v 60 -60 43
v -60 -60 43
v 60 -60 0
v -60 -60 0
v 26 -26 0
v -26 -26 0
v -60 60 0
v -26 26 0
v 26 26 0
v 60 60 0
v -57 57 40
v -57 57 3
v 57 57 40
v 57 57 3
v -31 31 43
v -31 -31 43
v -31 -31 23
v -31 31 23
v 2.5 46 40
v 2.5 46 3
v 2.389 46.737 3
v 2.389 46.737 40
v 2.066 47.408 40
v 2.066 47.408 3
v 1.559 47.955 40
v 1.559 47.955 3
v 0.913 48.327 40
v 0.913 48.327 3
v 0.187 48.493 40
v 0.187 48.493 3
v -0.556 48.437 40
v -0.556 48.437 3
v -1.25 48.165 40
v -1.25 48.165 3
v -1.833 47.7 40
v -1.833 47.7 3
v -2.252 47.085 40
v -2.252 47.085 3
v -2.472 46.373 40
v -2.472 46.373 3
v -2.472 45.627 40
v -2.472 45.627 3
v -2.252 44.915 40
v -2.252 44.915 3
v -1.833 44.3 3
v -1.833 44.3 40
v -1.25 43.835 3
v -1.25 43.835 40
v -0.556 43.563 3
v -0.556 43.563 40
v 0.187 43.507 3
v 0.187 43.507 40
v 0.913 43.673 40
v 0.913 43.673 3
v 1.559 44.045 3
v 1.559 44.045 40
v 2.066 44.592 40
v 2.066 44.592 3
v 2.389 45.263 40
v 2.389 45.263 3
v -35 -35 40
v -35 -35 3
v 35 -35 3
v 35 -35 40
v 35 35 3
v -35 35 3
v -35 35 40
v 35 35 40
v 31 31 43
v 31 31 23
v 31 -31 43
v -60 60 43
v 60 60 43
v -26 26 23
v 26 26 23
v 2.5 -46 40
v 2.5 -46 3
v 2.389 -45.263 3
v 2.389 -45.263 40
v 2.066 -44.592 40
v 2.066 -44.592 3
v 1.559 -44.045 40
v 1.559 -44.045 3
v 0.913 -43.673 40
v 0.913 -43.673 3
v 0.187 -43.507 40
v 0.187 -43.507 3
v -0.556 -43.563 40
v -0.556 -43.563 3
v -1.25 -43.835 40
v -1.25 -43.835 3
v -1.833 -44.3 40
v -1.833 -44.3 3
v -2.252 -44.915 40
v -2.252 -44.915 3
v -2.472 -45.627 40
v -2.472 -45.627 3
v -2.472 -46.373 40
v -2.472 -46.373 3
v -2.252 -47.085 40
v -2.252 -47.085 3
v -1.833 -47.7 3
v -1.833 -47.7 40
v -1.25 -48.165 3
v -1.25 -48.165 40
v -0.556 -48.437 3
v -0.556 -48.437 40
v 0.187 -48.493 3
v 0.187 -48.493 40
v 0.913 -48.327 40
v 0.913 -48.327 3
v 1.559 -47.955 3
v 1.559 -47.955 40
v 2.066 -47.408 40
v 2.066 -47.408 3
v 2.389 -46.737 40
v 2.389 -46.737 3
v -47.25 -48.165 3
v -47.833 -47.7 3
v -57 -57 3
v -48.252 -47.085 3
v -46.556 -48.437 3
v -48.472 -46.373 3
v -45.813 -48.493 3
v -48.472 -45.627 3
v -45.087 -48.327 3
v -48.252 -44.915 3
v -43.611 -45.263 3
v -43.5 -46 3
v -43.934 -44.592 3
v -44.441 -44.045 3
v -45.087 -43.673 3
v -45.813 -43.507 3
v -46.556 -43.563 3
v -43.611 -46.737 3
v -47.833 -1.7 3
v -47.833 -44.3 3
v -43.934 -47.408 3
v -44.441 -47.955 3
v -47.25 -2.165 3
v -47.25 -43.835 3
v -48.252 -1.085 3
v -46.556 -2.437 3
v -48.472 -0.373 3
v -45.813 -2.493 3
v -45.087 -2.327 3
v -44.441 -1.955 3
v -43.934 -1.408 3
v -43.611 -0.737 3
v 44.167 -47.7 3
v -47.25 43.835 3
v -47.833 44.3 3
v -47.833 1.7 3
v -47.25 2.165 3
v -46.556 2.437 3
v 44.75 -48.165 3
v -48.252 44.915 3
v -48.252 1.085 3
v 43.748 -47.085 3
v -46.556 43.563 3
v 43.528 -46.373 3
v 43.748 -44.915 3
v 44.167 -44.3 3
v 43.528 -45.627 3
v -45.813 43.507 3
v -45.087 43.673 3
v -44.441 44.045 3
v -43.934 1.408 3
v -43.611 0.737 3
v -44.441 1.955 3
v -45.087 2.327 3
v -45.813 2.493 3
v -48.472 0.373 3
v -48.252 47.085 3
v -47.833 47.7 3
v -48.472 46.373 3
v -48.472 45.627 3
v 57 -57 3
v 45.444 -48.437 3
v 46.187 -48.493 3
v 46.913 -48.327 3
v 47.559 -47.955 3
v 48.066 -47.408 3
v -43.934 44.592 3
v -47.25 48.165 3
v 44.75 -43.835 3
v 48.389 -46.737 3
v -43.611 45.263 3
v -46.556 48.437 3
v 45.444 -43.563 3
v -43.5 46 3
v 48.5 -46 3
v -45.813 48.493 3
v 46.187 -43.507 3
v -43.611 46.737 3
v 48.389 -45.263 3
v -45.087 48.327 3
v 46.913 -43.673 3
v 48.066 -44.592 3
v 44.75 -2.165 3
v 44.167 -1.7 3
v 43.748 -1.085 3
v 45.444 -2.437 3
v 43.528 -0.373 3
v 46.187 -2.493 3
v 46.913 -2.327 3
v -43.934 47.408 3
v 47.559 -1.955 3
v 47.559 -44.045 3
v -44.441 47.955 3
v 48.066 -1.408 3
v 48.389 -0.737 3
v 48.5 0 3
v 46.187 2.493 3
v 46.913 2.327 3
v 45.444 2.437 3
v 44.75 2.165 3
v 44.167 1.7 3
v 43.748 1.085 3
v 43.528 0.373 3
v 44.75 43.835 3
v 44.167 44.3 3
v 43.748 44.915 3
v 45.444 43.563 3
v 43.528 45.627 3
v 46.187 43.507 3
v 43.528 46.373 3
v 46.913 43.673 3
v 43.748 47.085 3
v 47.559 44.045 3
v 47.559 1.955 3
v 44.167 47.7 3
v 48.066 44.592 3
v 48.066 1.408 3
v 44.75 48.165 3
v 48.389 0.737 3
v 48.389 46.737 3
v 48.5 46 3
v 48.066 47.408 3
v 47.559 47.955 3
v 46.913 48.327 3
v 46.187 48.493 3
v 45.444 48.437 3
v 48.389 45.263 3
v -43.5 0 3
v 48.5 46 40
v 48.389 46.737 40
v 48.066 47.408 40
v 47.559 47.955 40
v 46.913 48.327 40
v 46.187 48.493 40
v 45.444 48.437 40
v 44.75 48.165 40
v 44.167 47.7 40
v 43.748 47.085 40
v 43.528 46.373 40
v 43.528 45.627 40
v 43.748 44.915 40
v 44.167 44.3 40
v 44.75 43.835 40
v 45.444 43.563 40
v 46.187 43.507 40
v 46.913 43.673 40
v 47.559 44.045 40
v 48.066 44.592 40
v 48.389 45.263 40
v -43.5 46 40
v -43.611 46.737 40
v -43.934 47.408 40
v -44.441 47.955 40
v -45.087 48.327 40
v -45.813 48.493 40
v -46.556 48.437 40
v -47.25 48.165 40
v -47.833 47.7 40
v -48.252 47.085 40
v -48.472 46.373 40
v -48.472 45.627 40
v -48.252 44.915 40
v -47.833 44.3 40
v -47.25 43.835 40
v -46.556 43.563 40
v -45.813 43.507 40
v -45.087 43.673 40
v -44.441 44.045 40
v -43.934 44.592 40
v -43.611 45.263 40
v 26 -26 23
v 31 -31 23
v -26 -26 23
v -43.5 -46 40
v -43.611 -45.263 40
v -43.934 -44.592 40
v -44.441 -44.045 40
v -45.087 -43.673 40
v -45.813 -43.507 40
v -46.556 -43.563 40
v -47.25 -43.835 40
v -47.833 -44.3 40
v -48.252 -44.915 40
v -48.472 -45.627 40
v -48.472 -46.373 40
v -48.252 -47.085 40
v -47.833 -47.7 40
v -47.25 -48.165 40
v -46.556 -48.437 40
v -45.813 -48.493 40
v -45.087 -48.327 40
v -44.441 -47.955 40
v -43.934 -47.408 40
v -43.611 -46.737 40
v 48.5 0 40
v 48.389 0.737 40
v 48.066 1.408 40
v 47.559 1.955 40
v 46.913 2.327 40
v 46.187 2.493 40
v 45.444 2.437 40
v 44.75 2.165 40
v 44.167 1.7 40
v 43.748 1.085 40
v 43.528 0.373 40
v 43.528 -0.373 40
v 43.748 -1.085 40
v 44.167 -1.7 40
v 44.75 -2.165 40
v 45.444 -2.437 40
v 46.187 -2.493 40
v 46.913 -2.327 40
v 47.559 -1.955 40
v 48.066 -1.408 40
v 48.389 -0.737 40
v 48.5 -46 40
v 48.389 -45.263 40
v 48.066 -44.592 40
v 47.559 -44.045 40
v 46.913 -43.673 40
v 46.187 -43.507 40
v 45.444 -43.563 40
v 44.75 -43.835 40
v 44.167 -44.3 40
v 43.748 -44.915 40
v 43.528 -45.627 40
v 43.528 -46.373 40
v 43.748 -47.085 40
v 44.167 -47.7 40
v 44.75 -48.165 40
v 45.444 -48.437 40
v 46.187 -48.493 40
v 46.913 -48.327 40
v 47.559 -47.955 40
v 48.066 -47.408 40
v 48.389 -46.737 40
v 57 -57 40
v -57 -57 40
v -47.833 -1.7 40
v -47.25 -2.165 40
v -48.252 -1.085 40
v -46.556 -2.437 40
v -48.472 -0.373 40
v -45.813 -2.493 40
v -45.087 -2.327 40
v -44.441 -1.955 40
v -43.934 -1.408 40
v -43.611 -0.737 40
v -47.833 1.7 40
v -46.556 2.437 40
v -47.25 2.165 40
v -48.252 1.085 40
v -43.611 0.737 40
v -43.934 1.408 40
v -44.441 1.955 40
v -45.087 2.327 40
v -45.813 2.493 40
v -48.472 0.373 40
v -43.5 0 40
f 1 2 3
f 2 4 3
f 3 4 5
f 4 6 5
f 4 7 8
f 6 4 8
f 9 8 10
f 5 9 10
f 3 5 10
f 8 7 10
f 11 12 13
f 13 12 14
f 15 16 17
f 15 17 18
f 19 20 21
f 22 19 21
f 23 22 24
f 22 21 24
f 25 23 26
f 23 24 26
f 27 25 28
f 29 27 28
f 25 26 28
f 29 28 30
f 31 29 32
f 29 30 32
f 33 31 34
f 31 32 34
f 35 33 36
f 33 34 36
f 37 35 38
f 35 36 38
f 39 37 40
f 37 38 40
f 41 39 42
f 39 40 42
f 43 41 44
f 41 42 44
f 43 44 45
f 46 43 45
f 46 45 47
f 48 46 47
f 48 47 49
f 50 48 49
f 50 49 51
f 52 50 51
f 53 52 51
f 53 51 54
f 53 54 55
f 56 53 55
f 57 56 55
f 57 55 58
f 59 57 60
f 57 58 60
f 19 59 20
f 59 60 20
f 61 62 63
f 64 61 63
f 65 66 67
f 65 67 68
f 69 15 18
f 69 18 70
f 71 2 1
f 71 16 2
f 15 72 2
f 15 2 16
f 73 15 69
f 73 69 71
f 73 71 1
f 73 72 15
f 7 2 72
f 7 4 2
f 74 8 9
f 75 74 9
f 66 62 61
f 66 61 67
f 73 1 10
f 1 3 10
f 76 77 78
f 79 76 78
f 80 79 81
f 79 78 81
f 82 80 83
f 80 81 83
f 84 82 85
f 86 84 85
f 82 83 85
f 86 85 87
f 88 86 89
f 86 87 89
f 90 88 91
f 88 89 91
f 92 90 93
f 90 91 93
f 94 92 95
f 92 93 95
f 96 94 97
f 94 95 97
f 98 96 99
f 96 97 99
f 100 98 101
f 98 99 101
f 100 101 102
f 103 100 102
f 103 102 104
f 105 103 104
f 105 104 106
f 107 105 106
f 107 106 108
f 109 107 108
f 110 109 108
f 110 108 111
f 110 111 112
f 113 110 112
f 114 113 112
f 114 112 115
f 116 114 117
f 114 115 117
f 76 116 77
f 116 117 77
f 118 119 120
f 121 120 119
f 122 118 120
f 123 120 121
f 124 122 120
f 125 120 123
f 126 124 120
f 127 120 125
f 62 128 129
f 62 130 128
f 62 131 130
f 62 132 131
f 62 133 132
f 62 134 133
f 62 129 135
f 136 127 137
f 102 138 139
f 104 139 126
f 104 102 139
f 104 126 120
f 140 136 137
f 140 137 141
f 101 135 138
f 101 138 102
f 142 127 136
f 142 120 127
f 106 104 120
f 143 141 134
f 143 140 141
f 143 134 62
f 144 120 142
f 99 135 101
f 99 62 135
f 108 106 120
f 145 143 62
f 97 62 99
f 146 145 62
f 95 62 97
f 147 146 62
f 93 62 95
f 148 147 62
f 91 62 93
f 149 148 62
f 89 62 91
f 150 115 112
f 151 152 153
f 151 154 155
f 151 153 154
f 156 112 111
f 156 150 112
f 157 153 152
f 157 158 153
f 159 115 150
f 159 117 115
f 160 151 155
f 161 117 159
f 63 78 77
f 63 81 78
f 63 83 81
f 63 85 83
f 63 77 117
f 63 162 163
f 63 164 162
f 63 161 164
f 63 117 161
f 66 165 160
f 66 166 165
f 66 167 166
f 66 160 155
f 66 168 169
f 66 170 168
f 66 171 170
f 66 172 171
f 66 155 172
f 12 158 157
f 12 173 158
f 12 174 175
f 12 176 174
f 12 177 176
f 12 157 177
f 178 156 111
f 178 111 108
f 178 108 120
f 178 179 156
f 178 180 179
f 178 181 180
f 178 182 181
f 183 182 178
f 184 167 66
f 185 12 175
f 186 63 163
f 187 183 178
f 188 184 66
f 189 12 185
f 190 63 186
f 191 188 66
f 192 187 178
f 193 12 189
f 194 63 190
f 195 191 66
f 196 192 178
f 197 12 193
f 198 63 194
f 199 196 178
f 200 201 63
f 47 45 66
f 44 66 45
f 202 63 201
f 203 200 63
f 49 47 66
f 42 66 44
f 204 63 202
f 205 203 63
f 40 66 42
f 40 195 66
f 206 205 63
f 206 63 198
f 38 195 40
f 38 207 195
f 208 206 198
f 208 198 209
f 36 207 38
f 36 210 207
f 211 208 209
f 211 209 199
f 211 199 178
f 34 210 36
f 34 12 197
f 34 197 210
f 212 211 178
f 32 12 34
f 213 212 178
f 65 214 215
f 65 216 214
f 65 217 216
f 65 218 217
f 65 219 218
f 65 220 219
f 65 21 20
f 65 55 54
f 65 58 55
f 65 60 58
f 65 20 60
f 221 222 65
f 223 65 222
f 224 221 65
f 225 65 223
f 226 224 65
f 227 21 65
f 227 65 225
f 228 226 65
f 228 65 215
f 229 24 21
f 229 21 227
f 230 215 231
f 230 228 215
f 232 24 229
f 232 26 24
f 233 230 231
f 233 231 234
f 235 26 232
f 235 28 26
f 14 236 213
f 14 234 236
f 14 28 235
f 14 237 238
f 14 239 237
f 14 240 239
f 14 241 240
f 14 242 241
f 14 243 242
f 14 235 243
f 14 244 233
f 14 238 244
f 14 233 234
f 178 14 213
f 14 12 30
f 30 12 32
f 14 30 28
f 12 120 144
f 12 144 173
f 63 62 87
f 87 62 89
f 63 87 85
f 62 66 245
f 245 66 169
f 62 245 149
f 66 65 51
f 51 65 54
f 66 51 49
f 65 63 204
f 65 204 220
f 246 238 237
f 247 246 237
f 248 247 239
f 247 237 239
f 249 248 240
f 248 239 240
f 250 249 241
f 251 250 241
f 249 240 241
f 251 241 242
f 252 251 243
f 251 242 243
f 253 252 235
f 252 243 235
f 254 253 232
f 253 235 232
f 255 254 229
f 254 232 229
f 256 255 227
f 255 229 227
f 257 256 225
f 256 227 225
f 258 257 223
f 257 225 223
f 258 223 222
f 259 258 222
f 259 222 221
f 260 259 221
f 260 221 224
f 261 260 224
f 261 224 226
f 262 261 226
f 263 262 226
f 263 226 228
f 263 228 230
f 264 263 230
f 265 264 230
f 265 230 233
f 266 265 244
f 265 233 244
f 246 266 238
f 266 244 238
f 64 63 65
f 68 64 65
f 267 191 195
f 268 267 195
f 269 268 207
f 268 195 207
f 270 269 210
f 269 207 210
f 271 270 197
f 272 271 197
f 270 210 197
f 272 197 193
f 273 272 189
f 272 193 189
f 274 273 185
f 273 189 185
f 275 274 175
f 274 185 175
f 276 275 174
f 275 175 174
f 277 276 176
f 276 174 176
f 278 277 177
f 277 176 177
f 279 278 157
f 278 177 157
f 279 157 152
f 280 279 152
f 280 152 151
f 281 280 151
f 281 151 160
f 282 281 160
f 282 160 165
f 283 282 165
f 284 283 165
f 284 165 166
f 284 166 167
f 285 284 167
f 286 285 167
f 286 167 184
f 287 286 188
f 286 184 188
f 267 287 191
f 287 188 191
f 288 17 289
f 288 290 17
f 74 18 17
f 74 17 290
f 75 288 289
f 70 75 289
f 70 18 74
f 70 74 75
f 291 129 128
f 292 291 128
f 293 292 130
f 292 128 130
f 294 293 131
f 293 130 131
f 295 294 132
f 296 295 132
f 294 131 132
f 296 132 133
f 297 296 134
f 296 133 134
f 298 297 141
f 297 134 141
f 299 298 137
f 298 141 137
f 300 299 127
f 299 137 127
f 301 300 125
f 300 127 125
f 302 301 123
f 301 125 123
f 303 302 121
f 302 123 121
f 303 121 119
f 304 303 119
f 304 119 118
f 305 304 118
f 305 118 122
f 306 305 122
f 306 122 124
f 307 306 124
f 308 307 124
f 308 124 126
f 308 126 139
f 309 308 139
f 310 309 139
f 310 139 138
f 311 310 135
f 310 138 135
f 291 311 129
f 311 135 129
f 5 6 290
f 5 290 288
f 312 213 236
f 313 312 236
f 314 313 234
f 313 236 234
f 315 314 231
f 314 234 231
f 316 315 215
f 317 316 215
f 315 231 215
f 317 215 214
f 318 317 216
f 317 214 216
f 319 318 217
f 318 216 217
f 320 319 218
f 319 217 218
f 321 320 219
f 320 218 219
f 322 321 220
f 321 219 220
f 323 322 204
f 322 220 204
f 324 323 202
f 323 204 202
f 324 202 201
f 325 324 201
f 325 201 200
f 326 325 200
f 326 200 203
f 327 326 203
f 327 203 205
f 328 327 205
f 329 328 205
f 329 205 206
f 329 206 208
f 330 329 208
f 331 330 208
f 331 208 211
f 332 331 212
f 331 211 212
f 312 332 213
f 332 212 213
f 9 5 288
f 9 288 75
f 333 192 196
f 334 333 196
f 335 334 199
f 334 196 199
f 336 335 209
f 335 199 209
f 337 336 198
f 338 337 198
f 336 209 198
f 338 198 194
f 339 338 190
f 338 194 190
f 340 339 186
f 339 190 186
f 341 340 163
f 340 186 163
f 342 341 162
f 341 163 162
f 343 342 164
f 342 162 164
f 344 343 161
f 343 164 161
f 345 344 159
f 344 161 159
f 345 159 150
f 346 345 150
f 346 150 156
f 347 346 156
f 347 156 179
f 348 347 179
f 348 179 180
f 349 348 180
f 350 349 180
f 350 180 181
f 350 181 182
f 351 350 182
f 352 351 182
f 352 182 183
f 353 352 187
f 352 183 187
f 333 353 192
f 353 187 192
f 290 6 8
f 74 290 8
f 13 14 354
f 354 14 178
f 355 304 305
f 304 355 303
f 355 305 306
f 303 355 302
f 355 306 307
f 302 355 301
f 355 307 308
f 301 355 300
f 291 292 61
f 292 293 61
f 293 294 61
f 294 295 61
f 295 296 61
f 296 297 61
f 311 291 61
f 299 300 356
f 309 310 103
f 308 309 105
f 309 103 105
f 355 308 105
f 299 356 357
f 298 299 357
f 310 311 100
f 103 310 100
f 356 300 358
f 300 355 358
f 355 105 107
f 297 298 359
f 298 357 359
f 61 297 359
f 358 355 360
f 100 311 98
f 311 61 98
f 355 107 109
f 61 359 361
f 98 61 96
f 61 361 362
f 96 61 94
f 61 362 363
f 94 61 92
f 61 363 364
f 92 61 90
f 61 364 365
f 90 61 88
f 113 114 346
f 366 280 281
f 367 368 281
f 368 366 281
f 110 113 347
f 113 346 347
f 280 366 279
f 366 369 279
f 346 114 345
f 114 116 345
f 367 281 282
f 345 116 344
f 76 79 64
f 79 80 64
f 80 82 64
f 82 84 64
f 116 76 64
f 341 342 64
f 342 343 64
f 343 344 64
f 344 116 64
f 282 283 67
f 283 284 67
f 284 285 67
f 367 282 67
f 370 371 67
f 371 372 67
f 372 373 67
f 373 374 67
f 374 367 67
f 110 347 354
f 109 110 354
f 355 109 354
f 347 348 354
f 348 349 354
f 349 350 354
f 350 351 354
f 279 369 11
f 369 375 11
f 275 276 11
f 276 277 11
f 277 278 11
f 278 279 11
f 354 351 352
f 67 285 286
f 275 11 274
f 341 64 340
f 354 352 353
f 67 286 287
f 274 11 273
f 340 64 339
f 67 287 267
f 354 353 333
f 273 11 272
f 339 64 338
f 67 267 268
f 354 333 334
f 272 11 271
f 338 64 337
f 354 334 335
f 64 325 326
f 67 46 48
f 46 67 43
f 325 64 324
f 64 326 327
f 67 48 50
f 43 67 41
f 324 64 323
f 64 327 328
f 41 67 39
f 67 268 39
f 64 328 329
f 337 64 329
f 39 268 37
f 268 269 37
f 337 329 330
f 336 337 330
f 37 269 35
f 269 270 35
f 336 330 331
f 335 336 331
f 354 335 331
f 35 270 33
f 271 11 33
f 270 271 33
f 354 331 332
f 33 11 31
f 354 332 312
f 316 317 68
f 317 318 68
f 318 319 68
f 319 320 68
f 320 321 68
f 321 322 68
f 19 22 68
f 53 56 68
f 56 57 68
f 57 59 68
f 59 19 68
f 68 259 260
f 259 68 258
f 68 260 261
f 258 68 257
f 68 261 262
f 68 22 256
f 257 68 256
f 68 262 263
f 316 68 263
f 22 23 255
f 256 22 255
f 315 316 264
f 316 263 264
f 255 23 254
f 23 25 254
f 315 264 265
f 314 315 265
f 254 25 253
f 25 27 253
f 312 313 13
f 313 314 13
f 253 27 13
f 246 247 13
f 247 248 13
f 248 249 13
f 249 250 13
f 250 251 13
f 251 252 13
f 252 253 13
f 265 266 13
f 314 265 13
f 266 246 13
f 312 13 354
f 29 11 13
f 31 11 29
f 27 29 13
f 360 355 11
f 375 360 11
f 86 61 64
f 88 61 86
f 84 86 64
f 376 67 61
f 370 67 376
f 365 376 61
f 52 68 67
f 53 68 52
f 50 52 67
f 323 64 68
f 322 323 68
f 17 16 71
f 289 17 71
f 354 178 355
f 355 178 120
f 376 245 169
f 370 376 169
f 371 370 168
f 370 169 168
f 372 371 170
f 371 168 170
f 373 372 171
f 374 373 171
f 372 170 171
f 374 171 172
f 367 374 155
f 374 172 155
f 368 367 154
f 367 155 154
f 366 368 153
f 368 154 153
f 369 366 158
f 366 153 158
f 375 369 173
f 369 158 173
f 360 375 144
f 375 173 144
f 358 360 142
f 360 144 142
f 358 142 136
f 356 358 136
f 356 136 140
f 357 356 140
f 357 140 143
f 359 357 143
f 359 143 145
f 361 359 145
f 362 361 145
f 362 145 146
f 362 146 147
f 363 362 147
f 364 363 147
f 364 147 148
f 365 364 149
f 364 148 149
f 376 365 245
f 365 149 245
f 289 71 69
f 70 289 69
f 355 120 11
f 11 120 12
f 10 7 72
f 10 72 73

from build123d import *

# Parameters (mm, degrees)
F0_W     = 120
F0_H     = 120
F1_DEPTH = 3
F2_W     = 52
F2_H     = 52
F3_DEPTH = 25
F2_W_2   = 120
F2_H_2   = 120
F2_W_3   = 70
F2_H_3   = 70
F2_R     = 2.5
F4_DEPTH = 37
F5_W     = 120
F5_H     = 120
F5_W_2   = 114
F5_H_2   = 114
F5_W_3   = 52
F5_H_3   = 52
F6_DEPTH = 3
F7_W     = 62
F7_H     = 62
F7_W_2   = 52
F7_H_2   = 52
F8_DEPTH = 20


with BuildPart() as f1:
    # F0 (on Top) → F1 (new body)
    with BuildSketch(Plane.XY):
        Rectangle(F0_W, F0_H)
    extrude(amount=F1_DEPTH)

    # F2 (on face) → F3 (cut)
    with BuildSketch(Plane.XY.offset(3)):
        Rectangle(F2_W, F2_H)
    extrude(amount=-F3_DEPTH, mode=Mode.SUBTRACT)

    # F2 (on face) → F4 (join)
    with BuildSketch(Plane.XY.offset(3)):
        Rectangle(F2_W_2, F2_H_2)
        Polygon((-57, -57), (-57, -35), (-57, 35), (-57, 57), (-35, 57), (35, 57), (57, 57), (57, 35), (57, -35), (57, -57), (35, -57), (-35, -57), align=None, mode=Mode.SUBTRACT)
        Rectangle(F2_W_3, F2_H_3)
        Rectangle(F2_W, F2_H, mode=Mode.SUBTRACT)
        with Locations((46, 46)):
            Circle(F2_R)
        with Locations((0, 46)):
            Circle(F2_R)
        with Locations((-46, 46)):
            Circle(F2_R)
        with Locations((-46, 0)):
            Circle(F2_R)
        with Locations((-46, -46)):
            Circle(F2_R)
        with Locations((0, -46)):
            Circle(F2_R)
        with Locations((46, -46)):
            Circle(F2_R)
        with Locations((46, 0)):
            Circle(F2_R)
    extrude(amount=F4_DEPTH)

    # F5 (on face) → F6 (join)
    with BuildSketch(Plane.XY.offset(40)):
        Rectangle(F5_W, F5_H)
        Rectangle(F5_W_2, F5_H_2, mode=Mode.SUBTRACT)
        Rectangle(F5_W_2, F5_H_2)
        Rectangle(F5_W_3, F5_H_3, mode=Mode.SUBTRACT)
    extrude(amount=F6_DEPTH)

    # F7 (on face) → F8 (cut)
    with BuildSketch(Plane.XY.offset(43)):
        Rectangle(F7_W, F7_H)
        Rectangle(F7_W_2, F7_H_2, mode=Mode.SUBTRACT)
    extrude(amount=-F8_DEPTH, mode=Mode.SUBTRACT)


solid = f1.part
